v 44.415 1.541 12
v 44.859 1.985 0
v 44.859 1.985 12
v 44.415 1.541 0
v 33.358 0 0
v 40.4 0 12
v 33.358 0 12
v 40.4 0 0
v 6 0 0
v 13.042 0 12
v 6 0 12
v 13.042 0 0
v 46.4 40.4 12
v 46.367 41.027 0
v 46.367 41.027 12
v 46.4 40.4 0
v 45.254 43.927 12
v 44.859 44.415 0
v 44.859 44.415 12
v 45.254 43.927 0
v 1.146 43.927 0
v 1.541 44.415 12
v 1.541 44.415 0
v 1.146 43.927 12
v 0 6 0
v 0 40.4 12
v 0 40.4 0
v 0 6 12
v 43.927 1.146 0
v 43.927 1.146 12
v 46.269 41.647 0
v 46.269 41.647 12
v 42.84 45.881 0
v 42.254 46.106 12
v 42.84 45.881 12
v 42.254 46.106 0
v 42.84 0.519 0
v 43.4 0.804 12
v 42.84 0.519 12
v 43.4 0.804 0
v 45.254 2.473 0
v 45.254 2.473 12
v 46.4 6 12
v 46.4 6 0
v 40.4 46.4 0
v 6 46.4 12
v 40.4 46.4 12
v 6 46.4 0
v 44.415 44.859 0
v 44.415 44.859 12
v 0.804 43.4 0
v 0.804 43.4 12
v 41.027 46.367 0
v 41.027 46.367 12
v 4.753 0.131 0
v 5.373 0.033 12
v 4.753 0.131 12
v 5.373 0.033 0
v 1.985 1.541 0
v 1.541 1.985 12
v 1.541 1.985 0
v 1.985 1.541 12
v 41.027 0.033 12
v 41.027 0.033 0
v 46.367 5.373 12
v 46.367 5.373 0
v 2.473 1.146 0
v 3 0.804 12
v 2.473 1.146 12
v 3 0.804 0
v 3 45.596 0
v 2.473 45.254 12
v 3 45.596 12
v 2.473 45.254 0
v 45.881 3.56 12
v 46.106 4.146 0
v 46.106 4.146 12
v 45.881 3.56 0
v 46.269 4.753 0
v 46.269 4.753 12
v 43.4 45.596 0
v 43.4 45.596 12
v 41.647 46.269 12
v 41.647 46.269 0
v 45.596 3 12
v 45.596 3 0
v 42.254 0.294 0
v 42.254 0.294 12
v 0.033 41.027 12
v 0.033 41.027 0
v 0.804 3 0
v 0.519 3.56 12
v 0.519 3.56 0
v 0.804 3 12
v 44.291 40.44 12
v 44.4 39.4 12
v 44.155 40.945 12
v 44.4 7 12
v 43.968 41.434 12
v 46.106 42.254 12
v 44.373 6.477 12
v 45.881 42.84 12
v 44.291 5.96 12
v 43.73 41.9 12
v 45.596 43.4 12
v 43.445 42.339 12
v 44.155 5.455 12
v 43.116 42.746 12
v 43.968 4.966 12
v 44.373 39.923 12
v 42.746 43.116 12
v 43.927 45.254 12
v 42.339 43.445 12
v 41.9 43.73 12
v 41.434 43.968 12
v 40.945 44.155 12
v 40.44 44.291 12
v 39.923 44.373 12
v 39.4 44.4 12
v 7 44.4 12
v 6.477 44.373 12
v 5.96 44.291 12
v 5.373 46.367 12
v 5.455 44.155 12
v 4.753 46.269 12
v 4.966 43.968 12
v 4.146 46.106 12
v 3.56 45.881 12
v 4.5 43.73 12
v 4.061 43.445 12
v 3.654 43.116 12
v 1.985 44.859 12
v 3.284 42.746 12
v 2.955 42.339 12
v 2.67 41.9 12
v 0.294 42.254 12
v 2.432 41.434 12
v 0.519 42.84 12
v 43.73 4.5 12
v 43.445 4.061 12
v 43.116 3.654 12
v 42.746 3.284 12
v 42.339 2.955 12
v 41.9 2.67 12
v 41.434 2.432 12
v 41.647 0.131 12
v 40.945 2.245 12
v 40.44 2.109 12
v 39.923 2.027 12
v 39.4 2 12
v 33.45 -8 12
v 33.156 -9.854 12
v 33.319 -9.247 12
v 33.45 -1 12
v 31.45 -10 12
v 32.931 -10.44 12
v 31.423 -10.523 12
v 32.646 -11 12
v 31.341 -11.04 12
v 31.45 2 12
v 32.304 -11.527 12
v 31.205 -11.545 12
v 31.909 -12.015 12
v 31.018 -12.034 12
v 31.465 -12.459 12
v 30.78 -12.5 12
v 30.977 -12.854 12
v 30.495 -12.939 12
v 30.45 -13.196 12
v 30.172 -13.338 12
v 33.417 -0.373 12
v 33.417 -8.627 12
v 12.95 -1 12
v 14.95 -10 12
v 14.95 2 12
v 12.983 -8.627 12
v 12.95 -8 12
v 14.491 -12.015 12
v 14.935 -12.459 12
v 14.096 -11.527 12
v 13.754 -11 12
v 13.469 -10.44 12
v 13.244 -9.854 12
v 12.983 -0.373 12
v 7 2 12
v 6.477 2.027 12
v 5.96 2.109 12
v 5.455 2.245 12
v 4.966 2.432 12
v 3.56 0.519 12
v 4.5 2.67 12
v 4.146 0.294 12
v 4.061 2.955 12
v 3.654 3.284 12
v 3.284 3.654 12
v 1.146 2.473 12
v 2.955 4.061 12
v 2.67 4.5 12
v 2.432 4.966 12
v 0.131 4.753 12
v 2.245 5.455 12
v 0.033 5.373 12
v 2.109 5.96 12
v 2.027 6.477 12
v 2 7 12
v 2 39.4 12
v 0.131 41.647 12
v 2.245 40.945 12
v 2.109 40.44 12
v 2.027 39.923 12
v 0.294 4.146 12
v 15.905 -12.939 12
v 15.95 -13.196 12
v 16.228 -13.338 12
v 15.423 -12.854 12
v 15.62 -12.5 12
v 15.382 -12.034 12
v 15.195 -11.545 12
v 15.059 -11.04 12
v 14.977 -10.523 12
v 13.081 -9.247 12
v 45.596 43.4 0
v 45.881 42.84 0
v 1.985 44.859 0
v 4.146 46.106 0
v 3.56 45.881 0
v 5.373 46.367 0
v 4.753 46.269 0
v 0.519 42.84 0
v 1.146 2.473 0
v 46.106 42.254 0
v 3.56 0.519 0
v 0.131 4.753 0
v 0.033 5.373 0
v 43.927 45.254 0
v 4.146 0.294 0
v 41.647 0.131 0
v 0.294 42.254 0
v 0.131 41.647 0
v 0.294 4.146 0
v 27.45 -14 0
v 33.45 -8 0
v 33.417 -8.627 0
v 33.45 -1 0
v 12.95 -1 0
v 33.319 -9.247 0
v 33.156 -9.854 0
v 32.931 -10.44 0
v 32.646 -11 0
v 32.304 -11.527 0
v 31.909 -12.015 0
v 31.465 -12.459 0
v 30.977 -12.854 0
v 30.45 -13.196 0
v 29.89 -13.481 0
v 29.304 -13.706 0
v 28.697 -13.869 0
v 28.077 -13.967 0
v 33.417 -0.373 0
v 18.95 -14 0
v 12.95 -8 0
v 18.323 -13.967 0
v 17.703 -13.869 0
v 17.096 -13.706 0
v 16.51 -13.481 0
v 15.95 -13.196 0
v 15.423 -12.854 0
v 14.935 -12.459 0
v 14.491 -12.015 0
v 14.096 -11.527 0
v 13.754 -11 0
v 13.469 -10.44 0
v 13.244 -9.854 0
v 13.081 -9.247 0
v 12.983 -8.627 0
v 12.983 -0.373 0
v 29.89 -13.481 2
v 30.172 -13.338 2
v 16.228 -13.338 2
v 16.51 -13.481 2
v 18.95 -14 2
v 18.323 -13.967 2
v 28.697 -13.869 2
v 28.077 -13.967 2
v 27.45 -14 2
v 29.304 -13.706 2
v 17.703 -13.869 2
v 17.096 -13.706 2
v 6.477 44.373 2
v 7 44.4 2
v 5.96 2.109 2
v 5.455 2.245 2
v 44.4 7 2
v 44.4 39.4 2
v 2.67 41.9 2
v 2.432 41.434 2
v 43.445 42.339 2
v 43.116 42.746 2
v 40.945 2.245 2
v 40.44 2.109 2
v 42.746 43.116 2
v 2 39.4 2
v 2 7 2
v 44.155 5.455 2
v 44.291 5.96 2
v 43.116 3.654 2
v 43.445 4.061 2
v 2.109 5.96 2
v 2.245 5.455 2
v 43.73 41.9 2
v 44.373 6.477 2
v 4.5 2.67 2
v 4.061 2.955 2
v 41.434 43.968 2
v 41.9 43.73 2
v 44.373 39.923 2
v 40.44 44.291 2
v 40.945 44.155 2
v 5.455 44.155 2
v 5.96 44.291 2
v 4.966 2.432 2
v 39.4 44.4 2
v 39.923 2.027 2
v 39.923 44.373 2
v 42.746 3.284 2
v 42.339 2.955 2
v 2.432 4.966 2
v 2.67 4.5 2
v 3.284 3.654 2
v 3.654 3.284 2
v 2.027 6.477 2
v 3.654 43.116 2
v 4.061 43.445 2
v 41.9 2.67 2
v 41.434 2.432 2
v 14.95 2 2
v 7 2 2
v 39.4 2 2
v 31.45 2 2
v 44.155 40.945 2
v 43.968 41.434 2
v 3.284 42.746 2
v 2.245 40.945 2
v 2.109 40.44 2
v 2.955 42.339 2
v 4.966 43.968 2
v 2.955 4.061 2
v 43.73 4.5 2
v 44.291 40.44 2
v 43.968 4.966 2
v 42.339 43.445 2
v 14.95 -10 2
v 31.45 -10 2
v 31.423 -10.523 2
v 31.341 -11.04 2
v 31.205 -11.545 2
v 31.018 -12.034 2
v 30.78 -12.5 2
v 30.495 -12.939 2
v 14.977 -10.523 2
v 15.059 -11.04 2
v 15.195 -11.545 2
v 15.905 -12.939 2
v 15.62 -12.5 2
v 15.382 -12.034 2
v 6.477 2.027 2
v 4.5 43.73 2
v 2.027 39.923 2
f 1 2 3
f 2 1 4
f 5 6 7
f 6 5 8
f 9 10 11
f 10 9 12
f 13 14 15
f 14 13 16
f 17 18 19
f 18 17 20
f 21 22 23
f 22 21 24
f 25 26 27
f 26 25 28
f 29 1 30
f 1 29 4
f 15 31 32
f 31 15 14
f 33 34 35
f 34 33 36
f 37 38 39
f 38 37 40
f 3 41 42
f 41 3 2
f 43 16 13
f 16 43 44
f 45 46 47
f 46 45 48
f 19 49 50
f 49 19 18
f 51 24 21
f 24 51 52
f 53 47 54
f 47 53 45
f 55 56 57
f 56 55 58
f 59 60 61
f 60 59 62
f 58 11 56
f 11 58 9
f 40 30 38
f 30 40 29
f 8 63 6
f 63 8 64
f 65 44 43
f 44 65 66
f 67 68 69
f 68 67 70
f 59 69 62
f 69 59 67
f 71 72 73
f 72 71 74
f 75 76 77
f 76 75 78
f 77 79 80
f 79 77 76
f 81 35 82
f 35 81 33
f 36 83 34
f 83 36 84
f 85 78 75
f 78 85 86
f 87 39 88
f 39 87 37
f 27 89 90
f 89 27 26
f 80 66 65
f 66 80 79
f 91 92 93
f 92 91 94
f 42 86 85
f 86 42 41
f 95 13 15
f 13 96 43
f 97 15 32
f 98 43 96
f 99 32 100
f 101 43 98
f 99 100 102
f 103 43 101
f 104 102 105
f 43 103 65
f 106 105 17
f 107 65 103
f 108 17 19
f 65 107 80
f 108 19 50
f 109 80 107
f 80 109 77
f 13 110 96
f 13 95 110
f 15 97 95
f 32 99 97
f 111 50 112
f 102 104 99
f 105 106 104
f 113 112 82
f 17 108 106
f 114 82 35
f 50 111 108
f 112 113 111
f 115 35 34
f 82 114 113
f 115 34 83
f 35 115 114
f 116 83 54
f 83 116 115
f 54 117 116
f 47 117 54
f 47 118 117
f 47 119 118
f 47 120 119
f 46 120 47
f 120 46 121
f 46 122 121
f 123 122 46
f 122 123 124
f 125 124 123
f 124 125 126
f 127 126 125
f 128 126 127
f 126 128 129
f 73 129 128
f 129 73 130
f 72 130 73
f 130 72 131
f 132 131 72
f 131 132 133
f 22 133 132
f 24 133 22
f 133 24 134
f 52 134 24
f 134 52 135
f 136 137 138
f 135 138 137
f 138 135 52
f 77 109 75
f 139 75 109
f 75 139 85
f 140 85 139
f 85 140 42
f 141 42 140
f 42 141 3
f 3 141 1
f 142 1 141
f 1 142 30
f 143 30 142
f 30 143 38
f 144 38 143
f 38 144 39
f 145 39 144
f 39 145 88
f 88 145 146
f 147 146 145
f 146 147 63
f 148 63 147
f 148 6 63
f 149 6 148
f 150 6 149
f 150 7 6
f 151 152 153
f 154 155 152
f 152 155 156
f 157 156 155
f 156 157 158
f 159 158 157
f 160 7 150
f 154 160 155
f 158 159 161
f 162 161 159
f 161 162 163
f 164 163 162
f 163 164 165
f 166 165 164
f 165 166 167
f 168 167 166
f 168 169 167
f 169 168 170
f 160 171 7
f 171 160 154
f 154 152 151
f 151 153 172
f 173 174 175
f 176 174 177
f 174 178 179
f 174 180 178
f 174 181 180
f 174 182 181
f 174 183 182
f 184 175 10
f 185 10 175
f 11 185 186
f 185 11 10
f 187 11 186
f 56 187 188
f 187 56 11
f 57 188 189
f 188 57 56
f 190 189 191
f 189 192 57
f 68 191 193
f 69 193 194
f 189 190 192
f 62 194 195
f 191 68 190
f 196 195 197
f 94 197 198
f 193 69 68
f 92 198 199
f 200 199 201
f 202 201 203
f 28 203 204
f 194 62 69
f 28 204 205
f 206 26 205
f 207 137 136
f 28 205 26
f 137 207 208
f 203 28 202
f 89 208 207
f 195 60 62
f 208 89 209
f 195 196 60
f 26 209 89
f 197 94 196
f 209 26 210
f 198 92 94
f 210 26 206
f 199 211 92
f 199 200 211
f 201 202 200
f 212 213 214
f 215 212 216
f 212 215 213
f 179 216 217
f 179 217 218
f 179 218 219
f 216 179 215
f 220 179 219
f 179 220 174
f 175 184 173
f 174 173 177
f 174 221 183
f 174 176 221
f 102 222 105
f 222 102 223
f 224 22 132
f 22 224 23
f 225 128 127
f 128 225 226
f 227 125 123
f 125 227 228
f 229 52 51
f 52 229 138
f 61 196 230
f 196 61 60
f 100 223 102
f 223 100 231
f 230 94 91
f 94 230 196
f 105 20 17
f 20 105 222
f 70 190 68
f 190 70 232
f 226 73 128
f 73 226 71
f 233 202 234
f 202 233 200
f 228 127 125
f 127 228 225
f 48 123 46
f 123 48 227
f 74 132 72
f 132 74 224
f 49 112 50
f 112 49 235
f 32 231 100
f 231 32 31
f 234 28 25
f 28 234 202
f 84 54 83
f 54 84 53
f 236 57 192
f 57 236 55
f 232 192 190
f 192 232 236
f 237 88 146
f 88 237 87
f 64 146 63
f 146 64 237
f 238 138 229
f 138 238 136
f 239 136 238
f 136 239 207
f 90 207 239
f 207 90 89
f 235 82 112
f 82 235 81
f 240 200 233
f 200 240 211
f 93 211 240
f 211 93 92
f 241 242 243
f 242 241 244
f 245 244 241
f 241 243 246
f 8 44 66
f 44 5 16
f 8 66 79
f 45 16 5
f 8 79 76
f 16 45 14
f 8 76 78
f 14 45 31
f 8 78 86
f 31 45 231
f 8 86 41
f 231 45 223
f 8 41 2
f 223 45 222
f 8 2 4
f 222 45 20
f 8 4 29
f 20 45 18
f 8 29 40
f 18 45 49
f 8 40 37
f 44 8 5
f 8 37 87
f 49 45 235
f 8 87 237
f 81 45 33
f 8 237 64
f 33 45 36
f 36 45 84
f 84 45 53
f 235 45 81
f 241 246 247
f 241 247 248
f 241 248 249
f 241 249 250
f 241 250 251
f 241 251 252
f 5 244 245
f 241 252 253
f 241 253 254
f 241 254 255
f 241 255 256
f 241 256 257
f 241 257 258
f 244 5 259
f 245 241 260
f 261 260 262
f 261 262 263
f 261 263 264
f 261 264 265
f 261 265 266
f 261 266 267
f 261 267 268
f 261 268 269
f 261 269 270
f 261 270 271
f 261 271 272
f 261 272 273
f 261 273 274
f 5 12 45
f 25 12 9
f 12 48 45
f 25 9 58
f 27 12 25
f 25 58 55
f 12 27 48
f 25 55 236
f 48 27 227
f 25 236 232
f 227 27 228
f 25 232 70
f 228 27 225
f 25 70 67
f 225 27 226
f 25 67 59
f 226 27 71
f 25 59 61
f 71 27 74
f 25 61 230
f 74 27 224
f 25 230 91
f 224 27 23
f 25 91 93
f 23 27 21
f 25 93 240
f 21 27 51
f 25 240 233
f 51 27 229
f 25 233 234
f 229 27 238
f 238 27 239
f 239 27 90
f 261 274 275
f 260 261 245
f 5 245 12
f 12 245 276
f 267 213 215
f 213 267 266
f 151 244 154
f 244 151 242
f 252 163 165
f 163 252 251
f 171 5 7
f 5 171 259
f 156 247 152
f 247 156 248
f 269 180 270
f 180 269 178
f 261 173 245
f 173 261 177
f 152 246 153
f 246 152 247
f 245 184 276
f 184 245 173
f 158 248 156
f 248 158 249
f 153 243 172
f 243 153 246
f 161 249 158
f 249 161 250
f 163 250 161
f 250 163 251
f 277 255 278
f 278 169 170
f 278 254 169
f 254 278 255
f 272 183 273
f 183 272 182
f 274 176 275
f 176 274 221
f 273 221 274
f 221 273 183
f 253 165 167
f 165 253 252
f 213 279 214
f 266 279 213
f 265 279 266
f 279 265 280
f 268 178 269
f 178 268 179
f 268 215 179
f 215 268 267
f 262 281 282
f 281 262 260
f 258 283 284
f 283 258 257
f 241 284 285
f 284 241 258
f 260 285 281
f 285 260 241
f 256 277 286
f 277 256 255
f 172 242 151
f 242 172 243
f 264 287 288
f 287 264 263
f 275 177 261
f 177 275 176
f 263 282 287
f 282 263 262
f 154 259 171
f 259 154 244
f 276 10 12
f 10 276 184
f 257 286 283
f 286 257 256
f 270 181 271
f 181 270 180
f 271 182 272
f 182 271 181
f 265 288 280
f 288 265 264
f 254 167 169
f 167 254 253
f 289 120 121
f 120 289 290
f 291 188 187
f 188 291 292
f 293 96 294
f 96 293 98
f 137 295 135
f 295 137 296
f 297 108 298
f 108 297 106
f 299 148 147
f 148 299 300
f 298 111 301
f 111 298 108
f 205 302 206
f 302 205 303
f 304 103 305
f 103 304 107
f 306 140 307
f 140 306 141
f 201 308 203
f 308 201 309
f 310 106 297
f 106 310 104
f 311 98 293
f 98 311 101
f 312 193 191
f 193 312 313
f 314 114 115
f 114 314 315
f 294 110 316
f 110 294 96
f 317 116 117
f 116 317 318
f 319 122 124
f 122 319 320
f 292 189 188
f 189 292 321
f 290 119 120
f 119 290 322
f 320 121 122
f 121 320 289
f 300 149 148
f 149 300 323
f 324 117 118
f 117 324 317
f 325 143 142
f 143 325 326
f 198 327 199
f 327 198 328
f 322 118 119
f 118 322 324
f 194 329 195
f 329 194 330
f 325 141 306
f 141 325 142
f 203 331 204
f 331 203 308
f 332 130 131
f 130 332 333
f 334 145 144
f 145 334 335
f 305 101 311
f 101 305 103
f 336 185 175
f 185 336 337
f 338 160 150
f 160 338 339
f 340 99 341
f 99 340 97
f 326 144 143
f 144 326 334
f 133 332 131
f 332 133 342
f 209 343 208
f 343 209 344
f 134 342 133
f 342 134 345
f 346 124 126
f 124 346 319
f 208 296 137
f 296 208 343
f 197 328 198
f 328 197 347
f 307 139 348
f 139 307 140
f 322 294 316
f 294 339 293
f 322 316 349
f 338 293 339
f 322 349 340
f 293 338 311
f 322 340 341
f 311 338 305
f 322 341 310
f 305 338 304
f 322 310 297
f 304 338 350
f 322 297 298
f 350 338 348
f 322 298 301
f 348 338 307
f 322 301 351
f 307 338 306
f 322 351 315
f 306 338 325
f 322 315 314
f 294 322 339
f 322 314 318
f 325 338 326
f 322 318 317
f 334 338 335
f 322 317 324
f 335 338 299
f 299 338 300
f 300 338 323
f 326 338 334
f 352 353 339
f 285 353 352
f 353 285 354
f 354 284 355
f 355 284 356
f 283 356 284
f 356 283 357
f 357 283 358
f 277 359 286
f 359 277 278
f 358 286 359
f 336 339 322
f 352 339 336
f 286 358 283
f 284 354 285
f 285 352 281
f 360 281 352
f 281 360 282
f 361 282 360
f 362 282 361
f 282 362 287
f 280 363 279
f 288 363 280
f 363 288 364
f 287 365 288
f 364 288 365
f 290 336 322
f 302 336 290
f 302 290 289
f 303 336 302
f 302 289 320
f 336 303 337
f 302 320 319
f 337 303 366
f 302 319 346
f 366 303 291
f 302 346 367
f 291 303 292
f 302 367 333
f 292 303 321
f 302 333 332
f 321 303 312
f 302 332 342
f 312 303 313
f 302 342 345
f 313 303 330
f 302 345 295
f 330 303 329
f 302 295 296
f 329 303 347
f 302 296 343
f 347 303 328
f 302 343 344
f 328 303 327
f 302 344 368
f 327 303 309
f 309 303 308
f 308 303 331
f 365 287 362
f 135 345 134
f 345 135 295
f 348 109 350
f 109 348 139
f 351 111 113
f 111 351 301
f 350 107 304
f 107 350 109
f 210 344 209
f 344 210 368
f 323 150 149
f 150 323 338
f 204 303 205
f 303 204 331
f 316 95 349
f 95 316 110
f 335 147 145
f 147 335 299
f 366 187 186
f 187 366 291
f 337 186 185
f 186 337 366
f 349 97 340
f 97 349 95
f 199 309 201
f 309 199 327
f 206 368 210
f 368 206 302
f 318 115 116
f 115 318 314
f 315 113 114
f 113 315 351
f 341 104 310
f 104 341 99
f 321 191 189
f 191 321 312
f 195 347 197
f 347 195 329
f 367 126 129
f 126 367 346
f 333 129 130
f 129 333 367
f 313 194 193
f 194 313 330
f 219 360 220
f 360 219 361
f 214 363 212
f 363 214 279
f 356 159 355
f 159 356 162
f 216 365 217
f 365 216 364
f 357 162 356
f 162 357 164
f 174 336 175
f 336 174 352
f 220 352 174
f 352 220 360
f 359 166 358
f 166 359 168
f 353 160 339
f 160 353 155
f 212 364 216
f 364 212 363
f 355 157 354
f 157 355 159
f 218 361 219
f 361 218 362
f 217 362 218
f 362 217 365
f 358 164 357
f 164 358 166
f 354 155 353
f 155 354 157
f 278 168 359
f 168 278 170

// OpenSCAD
/* Copyright (C) Peter Ivanov <ivanovp@gmail.com>, 2015 */
/* License: Creative Commons - Attribution - Non-commercial (CC BY-NC) /

/* [Global] */
motor_width = 42.4; // 42.2-vel kicsit kicsi lett
wall_thickness = 2;
outer_width = motor_width + wall_thickness * 2;
base_height = wall_thickness;
height = base_height + 10;
epsilon = 0.1;
cable_width = 16.5;
cable_length = 10;
r = 5;
protector_width = cable_width + wall_thickness * 2;
protector_length = cable_length + wall_thickness * 2 + r;

$fn = 60;

difference()
{
    union()
    {
        rounded_cube(outer_width, outer_width, height, r + wall_thickness / 2);
        translate([outer_width / 2 - protector_width / 2, -protector_length + r, 0])
        {
            //cube([protector_width, protector_length, height]);
            rounded_cube(protector_width, protector_length, height, r + wall_thickness / 2);
        }
    }
    translate([wall_thickness, wall_thickness, base_height])
    {
        rounded_cube(motor_width, motor_width, height - base_height + epsilon, r);
    }
    translate([outer_width / 2 - cable_width / 2, -cable_length * 2 + r, base_height])
    {
        //cube([cable_width, cable_length * 2, height - base_height + epsilon]);
        rounded_cube(cable_width, cable_length * 3, height - base_height + epsilon, r);
    }
}

module rounded_cube(w, l, h, r)
{
    hull()
    {
     translate([0 + r, 0 + r, 0]) cylinder(r=r, h=h);
     translate([w - r, 0 + r, 0]) cylinder(r=r, h=h);
     translate([w - r, l - r, 0]) cylinder(r=r, h=h);
     translate([0 + r, l - r, 0]) cylinder(r=r, h=h);
    }
}

module hexagon(width, height, baseAngle) 
{
  bwidth = width / 1.75;
  for (angle = [baseAngle, baseAngle + 60, baseAngle + 120]) 
  {
      rotate([0, 0, angle]) cube([bwidth, width, height], true);
  }
}
